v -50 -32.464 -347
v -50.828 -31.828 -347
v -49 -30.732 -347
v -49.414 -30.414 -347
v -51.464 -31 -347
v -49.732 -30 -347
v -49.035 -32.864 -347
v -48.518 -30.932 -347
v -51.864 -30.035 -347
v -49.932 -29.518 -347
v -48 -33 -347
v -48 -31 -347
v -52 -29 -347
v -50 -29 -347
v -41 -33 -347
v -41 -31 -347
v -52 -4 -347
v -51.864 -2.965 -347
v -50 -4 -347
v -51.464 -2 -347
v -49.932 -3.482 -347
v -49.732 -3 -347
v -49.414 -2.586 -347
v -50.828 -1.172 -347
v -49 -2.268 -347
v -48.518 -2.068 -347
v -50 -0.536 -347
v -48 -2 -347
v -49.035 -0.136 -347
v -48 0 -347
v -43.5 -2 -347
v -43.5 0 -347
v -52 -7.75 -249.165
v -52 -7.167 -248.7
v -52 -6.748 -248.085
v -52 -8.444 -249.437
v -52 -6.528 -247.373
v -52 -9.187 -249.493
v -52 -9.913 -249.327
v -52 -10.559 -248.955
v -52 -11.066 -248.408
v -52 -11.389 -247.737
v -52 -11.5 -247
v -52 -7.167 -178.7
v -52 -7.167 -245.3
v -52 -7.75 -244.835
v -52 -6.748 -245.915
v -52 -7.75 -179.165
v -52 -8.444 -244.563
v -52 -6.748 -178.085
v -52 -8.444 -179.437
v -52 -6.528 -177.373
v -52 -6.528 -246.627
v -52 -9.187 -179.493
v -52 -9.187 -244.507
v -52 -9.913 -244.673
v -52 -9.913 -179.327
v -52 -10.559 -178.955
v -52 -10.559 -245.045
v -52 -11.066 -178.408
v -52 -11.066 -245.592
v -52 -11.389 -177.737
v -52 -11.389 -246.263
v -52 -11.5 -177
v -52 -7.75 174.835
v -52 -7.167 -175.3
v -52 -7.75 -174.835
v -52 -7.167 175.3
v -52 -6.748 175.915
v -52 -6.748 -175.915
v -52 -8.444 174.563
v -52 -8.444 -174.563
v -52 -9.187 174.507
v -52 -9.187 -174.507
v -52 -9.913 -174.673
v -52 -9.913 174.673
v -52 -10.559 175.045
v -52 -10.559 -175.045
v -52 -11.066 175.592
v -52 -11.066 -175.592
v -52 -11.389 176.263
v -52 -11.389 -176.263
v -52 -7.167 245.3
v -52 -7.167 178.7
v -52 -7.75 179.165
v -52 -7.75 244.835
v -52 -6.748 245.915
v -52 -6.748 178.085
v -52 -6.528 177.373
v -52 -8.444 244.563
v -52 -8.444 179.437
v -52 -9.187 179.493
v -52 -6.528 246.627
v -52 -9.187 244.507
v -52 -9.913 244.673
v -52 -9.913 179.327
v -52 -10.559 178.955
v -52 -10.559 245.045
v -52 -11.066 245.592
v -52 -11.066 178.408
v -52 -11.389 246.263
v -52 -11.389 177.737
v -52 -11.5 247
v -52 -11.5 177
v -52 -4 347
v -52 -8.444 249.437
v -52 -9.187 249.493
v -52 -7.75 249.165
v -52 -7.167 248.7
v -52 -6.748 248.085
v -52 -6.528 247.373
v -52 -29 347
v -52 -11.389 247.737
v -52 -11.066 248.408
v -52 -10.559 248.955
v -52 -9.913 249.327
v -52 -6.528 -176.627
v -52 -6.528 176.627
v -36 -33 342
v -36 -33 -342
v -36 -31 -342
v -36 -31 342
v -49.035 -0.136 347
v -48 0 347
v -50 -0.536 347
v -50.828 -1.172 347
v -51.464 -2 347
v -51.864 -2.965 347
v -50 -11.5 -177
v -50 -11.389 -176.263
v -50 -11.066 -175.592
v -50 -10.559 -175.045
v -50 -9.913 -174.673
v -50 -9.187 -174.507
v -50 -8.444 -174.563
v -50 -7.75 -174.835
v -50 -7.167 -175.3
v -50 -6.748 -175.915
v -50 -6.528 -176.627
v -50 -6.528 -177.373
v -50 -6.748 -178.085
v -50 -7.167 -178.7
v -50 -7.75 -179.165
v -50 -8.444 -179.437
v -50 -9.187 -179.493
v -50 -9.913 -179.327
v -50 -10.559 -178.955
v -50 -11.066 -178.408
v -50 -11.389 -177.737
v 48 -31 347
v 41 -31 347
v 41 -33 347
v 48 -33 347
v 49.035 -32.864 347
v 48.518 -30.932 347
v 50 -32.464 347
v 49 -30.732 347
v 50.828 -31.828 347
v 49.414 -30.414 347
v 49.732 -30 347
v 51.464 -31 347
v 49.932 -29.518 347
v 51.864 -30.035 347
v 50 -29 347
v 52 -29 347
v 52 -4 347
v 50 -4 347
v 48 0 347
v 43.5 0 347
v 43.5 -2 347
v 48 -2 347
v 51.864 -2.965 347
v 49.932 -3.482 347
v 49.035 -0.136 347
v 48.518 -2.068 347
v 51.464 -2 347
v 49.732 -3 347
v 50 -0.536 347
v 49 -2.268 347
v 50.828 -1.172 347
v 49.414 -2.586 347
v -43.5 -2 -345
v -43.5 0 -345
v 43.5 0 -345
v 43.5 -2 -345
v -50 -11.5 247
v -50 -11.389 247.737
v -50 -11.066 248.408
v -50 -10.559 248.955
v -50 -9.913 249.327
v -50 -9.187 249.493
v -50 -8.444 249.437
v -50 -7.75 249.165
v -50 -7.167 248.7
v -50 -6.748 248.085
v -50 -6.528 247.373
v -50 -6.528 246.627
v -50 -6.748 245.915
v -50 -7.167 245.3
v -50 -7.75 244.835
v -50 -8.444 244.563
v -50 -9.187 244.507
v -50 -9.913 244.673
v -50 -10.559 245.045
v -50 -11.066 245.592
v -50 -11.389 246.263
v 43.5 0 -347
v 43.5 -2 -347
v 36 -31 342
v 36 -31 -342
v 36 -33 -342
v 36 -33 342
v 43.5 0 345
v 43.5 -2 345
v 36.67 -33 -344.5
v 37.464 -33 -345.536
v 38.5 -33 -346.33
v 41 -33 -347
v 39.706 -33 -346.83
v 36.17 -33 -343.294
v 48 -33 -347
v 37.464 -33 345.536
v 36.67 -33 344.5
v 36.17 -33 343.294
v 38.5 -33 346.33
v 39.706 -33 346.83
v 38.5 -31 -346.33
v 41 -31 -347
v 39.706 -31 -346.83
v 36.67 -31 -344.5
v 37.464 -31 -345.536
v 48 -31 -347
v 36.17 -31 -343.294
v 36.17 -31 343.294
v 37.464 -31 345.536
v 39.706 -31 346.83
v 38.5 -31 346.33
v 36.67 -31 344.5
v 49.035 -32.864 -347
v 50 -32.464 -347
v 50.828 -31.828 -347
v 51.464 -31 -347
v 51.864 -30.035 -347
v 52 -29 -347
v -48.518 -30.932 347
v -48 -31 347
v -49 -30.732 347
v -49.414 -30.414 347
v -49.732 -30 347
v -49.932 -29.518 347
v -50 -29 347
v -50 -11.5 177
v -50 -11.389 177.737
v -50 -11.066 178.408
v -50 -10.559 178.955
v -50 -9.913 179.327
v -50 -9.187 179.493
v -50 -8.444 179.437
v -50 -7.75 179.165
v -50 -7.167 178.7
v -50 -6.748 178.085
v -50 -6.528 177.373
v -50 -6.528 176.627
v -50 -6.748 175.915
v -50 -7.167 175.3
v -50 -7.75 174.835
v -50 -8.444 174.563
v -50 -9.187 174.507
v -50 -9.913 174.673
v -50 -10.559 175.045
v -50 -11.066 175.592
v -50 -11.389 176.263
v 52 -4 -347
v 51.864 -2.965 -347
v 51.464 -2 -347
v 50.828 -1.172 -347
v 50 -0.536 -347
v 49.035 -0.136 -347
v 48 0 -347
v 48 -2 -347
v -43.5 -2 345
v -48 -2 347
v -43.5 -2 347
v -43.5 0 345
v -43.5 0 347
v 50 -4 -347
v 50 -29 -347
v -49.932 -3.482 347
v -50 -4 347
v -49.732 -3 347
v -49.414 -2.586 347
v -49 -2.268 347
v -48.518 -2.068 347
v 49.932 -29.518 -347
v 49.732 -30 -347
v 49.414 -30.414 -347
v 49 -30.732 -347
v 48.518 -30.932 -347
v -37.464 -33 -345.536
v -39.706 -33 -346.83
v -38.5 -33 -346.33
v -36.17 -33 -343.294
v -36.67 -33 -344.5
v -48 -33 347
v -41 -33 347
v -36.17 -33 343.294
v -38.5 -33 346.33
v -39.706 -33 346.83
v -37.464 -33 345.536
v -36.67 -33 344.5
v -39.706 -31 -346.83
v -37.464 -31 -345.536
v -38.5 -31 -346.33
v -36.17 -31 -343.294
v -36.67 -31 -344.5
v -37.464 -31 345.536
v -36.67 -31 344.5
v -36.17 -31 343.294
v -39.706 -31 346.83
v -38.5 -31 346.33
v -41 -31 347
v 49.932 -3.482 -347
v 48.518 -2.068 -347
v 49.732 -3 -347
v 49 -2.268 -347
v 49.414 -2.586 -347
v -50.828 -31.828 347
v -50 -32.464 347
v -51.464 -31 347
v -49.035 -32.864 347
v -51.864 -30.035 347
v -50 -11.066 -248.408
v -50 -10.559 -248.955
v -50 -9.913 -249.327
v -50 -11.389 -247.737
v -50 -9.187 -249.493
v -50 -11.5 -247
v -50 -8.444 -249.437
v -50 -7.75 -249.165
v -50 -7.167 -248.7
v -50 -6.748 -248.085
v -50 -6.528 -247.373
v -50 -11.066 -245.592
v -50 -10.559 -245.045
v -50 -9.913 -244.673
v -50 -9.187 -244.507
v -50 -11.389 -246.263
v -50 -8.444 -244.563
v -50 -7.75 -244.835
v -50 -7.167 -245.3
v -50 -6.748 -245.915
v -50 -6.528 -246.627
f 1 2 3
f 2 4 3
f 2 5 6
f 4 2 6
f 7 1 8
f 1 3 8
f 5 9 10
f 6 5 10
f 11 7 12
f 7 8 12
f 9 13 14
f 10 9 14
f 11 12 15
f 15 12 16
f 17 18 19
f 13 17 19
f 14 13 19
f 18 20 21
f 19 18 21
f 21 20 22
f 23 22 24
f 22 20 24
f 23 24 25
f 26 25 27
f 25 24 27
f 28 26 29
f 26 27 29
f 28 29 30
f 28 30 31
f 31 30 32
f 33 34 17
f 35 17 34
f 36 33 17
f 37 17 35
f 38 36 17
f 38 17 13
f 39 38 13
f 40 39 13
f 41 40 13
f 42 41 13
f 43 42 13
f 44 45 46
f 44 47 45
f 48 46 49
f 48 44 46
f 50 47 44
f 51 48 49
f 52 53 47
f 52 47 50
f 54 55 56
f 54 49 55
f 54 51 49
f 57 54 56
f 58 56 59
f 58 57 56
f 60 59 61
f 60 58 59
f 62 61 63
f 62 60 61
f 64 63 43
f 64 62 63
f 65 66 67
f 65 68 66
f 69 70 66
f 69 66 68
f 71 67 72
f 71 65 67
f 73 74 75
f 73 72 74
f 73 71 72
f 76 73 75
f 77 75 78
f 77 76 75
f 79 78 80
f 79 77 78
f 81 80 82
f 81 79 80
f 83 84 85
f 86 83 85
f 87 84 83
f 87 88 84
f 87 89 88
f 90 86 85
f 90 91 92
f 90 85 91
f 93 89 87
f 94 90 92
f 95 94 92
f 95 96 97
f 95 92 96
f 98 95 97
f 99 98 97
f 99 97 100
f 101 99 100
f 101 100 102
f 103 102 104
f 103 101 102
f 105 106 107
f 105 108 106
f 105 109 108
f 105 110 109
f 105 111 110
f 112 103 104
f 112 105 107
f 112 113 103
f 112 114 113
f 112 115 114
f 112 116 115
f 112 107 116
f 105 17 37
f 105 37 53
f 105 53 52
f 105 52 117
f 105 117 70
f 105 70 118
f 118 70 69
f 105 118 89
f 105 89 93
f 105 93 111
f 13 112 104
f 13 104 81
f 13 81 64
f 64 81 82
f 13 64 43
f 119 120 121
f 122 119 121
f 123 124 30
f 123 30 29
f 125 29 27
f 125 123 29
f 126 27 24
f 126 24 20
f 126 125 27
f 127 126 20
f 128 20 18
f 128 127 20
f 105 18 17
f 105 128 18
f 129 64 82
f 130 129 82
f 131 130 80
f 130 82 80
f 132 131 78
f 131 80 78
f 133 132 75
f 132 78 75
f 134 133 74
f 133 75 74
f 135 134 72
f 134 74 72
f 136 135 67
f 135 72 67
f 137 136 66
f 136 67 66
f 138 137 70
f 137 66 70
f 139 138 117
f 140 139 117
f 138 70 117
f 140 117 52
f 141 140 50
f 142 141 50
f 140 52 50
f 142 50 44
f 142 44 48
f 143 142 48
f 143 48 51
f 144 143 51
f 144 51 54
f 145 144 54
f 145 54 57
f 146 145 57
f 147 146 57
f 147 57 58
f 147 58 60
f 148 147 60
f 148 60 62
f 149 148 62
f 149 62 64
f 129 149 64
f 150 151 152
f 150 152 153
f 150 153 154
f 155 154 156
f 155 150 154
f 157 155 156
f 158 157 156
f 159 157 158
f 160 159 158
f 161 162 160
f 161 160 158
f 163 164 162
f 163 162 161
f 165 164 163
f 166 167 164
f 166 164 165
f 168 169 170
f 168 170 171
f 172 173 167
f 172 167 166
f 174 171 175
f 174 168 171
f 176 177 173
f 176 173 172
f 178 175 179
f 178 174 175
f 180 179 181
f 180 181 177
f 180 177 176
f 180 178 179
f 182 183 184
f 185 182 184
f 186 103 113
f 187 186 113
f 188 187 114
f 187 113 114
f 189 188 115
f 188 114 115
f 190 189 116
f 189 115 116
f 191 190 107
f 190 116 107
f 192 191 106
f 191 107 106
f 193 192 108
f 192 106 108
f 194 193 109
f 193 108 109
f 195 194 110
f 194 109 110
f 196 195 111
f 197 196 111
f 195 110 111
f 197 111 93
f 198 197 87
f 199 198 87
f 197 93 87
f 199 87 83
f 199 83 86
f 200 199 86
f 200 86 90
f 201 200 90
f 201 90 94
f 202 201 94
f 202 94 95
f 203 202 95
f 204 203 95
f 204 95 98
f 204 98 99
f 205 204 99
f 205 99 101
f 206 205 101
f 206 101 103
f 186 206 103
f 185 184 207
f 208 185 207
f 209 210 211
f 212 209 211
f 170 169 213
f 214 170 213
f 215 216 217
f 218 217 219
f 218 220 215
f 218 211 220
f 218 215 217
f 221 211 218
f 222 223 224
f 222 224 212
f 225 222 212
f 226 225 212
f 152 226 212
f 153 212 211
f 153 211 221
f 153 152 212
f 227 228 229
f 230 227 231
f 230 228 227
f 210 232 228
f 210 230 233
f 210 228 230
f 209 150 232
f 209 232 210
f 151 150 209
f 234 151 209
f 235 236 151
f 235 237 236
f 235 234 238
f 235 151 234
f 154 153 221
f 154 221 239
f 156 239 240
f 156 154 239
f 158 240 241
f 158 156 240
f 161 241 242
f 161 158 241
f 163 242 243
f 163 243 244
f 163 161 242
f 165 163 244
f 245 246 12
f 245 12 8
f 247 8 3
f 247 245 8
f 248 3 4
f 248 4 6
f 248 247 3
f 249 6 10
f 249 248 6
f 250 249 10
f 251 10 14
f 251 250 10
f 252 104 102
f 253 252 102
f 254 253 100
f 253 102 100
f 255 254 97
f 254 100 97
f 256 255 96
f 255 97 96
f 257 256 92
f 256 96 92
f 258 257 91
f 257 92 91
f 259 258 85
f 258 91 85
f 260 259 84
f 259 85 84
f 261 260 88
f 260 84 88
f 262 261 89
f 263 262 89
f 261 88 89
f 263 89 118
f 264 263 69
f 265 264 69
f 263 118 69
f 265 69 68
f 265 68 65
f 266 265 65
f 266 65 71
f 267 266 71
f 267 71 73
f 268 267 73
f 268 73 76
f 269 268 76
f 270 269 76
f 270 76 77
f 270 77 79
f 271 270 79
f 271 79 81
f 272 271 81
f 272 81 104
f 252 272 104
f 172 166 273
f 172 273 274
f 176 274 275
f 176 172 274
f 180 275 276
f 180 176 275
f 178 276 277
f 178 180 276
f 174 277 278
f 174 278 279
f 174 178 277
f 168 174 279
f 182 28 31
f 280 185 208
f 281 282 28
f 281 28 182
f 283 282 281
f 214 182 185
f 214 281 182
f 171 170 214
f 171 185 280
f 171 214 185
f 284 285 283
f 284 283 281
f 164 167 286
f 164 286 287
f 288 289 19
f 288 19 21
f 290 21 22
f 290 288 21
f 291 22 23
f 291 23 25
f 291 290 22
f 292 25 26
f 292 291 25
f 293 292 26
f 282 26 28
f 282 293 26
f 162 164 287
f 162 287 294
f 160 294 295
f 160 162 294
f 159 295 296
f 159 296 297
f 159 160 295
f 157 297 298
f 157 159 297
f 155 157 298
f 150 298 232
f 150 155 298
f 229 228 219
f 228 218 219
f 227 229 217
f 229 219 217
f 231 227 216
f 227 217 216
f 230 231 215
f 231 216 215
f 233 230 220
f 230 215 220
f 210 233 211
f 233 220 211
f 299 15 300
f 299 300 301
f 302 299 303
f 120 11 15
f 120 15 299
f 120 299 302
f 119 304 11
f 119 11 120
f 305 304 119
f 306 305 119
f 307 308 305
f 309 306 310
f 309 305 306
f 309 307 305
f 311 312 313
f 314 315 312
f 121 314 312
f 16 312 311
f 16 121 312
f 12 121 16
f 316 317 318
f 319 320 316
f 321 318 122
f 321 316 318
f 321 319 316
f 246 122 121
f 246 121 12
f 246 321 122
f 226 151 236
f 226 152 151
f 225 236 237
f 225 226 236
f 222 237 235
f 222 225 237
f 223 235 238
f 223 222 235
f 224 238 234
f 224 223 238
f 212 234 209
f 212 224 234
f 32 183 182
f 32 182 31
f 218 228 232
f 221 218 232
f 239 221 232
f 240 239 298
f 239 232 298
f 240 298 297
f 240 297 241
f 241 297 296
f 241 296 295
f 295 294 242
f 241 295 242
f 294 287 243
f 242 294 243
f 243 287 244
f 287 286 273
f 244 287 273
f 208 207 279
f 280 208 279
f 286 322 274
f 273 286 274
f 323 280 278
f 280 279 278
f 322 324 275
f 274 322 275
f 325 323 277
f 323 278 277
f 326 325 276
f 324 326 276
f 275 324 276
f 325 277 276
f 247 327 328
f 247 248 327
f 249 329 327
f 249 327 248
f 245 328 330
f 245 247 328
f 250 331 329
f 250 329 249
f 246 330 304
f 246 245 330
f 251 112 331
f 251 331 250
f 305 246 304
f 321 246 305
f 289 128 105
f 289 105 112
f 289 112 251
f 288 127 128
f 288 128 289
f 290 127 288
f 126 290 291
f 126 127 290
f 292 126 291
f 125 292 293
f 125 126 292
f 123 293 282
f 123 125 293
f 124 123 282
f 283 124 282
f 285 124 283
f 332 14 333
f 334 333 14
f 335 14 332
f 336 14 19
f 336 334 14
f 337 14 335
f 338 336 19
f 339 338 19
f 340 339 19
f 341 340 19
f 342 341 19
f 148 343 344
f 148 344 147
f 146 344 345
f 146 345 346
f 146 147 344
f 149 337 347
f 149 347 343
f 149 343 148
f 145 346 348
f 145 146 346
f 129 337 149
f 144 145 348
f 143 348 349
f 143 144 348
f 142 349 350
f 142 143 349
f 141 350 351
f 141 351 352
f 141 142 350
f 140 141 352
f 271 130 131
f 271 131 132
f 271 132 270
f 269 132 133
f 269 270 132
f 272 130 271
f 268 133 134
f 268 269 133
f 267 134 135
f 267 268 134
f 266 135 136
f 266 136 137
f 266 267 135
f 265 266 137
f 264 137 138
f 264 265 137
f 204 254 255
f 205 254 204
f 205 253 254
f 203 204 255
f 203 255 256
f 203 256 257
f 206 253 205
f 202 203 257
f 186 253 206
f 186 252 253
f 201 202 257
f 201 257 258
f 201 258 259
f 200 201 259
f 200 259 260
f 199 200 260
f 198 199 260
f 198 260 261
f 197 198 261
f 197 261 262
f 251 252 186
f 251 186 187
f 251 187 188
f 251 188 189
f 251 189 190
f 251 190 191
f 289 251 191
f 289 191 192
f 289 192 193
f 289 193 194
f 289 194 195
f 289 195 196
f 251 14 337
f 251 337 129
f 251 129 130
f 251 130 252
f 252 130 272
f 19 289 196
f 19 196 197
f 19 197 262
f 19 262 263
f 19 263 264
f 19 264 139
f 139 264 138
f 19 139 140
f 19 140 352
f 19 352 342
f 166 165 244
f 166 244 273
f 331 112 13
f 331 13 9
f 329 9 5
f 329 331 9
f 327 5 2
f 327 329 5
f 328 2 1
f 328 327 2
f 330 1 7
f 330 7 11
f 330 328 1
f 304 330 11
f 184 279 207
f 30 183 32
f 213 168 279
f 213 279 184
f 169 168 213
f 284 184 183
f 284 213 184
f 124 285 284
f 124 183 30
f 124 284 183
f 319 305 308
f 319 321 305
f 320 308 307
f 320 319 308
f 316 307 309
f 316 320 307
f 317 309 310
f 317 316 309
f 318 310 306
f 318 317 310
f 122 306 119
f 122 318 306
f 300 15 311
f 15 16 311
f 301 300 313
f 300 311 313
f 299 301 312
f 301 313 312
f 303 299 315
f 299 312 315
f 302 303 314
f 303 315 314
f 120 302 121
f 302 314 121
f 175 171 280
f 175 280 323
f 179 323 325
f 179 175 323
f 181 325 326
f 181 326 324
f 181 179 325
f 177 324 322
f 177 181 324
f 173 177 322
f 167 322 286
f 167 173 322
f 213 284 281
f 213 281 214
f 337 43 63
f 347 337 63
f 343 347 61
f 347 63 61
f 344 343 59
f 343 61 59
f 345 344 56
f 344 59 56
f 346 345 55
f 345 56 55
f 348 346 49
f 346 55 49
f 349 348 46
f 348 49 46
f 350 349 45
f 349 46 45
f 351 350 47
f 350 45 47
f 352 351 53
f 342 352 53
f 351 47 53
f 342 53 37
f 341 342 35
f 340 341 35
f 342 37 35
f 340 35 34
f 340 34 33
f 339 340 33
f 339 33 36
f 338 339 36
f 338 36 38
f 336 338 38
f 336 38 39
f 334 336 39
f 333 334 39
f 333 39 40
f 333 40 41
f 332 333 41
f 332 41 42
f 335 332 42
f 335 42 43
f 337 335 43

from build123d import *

# Parameters (mm, degrees)
BASE_FLANGE1_DEPTH = 347
SKETCH4_W          = 87
SKETCH4_H          = 2
CUT_EXTRUDE1_DEPTH = 10
SKETCH8_R          = 2.5
CUT_EXTRUDE5_DEPTH = 10
LPATTERN4_COUNT    = 2
LPATTERN4_PITCH    = 424
FILLET1_R          = 5


# Sheet-metal steps are written as plain solids
with BuildPart() as part:
    # Sketch3 → Base-Flange1 (new, symmetric)
    with BuildSketch(Plane.XY):
        with BuildLine():
            Line((36, -33), (48, -33))
            ThreePointArc((48, -33), (50.828427125, -31.828427125), (52, -29))
            Line((52, -29), (52, -4))
            ThreePointArc((52, -4), (50.828427125, -1.171572875), (48, 0))
            Line((48, 0), (-48, 0))
            ThreePointArc((-48, 0), (-50.828427125, -1.171572875), (-52, -4))
            Line((-52, -4), (-52, -29))
            ThreePointArc((-52, -29), (-50.828427125, -31.828427125), (-48, -33))
            Line((-48, -33), (-36, -33))
            Line((-36, -33), (-36, -31))
            Line((-36, -31), (-48, -31))
            ThreePointArc((-48, -31), (-49.414213562, -30.414213562), (-50, -29))
            Line((-50, -29), (-50, -4))
            ThreePointArc((-50, -4), (-49.414213562, -2.585786438), (-48, -2))
            Line((-48, -2), (48, -2))
            ThreePointArc((48, -2), (49.414213562, -2.585786438), (50, -4))
            Line((50, -4), (50, -29))
            ThreePointArc((50, -29), (49.414213562, -30.414213562), (48, -31))
            Line((48, -31), (36, -31))
            Line((36, -31), (36, -33))
        make_face()
    extrude(amount=BASE_FLANGE1_DEPTH, both=True)

    # Sketch4 → Cut-Extrude1 (cut)
    with BuildSketch(Plane(origin=(0, 0, 0), x_dir=(1, 0, 0), z_dir=(0, 1, 0))):
        with Locations((0, -346)):
            Rectangle(SKETCH4_W, SKETCH4_H)
        with Locations((0, 346)):
            Rectangle(SKETCH4_W, SKETCH4_H)
    extrude(amount=-CUT_EXTRUDE1_DEPTH, mode=Mode.SUBTRACT)

    # Sketch8 → Cut-Extrude5 (cut)
    with BuildSketch(Plane.ZY.offset(52)):
        with Locations(Location((177, -9, 0), (0, 0, 270))):
            Circle(SKETCH8_R)
        with Locations(Location((247, -9, 0), (0, 0, 270))):
            Circle(SKETCH8_R)
    cut_extrude5 = extrude(amount=-CUT_EXTRUDE5_DEPTH, mode=Mode.SUBTRACT)

    # LPattern4: Cut-Extrude5 ×2
    with Locations(*[(0, 0, -i * LPATTERN4_PITCH) for i in range(1, LPATTERN4_COUNT)]):
        add(cut_extrude5, mode=Mode.SUBTRACT)

    # Fillet1
    fillet1_edges = [part.edges().sort_by_distance(p)[0] for p in [
        (-36, -32, -347),
        (36, -32, -347),
        (-36, -32, 347),
        (36, -32, 347),
    ]]
    fillet(fillet1_edges, radius=FILLET1_R)


solid = part.part
